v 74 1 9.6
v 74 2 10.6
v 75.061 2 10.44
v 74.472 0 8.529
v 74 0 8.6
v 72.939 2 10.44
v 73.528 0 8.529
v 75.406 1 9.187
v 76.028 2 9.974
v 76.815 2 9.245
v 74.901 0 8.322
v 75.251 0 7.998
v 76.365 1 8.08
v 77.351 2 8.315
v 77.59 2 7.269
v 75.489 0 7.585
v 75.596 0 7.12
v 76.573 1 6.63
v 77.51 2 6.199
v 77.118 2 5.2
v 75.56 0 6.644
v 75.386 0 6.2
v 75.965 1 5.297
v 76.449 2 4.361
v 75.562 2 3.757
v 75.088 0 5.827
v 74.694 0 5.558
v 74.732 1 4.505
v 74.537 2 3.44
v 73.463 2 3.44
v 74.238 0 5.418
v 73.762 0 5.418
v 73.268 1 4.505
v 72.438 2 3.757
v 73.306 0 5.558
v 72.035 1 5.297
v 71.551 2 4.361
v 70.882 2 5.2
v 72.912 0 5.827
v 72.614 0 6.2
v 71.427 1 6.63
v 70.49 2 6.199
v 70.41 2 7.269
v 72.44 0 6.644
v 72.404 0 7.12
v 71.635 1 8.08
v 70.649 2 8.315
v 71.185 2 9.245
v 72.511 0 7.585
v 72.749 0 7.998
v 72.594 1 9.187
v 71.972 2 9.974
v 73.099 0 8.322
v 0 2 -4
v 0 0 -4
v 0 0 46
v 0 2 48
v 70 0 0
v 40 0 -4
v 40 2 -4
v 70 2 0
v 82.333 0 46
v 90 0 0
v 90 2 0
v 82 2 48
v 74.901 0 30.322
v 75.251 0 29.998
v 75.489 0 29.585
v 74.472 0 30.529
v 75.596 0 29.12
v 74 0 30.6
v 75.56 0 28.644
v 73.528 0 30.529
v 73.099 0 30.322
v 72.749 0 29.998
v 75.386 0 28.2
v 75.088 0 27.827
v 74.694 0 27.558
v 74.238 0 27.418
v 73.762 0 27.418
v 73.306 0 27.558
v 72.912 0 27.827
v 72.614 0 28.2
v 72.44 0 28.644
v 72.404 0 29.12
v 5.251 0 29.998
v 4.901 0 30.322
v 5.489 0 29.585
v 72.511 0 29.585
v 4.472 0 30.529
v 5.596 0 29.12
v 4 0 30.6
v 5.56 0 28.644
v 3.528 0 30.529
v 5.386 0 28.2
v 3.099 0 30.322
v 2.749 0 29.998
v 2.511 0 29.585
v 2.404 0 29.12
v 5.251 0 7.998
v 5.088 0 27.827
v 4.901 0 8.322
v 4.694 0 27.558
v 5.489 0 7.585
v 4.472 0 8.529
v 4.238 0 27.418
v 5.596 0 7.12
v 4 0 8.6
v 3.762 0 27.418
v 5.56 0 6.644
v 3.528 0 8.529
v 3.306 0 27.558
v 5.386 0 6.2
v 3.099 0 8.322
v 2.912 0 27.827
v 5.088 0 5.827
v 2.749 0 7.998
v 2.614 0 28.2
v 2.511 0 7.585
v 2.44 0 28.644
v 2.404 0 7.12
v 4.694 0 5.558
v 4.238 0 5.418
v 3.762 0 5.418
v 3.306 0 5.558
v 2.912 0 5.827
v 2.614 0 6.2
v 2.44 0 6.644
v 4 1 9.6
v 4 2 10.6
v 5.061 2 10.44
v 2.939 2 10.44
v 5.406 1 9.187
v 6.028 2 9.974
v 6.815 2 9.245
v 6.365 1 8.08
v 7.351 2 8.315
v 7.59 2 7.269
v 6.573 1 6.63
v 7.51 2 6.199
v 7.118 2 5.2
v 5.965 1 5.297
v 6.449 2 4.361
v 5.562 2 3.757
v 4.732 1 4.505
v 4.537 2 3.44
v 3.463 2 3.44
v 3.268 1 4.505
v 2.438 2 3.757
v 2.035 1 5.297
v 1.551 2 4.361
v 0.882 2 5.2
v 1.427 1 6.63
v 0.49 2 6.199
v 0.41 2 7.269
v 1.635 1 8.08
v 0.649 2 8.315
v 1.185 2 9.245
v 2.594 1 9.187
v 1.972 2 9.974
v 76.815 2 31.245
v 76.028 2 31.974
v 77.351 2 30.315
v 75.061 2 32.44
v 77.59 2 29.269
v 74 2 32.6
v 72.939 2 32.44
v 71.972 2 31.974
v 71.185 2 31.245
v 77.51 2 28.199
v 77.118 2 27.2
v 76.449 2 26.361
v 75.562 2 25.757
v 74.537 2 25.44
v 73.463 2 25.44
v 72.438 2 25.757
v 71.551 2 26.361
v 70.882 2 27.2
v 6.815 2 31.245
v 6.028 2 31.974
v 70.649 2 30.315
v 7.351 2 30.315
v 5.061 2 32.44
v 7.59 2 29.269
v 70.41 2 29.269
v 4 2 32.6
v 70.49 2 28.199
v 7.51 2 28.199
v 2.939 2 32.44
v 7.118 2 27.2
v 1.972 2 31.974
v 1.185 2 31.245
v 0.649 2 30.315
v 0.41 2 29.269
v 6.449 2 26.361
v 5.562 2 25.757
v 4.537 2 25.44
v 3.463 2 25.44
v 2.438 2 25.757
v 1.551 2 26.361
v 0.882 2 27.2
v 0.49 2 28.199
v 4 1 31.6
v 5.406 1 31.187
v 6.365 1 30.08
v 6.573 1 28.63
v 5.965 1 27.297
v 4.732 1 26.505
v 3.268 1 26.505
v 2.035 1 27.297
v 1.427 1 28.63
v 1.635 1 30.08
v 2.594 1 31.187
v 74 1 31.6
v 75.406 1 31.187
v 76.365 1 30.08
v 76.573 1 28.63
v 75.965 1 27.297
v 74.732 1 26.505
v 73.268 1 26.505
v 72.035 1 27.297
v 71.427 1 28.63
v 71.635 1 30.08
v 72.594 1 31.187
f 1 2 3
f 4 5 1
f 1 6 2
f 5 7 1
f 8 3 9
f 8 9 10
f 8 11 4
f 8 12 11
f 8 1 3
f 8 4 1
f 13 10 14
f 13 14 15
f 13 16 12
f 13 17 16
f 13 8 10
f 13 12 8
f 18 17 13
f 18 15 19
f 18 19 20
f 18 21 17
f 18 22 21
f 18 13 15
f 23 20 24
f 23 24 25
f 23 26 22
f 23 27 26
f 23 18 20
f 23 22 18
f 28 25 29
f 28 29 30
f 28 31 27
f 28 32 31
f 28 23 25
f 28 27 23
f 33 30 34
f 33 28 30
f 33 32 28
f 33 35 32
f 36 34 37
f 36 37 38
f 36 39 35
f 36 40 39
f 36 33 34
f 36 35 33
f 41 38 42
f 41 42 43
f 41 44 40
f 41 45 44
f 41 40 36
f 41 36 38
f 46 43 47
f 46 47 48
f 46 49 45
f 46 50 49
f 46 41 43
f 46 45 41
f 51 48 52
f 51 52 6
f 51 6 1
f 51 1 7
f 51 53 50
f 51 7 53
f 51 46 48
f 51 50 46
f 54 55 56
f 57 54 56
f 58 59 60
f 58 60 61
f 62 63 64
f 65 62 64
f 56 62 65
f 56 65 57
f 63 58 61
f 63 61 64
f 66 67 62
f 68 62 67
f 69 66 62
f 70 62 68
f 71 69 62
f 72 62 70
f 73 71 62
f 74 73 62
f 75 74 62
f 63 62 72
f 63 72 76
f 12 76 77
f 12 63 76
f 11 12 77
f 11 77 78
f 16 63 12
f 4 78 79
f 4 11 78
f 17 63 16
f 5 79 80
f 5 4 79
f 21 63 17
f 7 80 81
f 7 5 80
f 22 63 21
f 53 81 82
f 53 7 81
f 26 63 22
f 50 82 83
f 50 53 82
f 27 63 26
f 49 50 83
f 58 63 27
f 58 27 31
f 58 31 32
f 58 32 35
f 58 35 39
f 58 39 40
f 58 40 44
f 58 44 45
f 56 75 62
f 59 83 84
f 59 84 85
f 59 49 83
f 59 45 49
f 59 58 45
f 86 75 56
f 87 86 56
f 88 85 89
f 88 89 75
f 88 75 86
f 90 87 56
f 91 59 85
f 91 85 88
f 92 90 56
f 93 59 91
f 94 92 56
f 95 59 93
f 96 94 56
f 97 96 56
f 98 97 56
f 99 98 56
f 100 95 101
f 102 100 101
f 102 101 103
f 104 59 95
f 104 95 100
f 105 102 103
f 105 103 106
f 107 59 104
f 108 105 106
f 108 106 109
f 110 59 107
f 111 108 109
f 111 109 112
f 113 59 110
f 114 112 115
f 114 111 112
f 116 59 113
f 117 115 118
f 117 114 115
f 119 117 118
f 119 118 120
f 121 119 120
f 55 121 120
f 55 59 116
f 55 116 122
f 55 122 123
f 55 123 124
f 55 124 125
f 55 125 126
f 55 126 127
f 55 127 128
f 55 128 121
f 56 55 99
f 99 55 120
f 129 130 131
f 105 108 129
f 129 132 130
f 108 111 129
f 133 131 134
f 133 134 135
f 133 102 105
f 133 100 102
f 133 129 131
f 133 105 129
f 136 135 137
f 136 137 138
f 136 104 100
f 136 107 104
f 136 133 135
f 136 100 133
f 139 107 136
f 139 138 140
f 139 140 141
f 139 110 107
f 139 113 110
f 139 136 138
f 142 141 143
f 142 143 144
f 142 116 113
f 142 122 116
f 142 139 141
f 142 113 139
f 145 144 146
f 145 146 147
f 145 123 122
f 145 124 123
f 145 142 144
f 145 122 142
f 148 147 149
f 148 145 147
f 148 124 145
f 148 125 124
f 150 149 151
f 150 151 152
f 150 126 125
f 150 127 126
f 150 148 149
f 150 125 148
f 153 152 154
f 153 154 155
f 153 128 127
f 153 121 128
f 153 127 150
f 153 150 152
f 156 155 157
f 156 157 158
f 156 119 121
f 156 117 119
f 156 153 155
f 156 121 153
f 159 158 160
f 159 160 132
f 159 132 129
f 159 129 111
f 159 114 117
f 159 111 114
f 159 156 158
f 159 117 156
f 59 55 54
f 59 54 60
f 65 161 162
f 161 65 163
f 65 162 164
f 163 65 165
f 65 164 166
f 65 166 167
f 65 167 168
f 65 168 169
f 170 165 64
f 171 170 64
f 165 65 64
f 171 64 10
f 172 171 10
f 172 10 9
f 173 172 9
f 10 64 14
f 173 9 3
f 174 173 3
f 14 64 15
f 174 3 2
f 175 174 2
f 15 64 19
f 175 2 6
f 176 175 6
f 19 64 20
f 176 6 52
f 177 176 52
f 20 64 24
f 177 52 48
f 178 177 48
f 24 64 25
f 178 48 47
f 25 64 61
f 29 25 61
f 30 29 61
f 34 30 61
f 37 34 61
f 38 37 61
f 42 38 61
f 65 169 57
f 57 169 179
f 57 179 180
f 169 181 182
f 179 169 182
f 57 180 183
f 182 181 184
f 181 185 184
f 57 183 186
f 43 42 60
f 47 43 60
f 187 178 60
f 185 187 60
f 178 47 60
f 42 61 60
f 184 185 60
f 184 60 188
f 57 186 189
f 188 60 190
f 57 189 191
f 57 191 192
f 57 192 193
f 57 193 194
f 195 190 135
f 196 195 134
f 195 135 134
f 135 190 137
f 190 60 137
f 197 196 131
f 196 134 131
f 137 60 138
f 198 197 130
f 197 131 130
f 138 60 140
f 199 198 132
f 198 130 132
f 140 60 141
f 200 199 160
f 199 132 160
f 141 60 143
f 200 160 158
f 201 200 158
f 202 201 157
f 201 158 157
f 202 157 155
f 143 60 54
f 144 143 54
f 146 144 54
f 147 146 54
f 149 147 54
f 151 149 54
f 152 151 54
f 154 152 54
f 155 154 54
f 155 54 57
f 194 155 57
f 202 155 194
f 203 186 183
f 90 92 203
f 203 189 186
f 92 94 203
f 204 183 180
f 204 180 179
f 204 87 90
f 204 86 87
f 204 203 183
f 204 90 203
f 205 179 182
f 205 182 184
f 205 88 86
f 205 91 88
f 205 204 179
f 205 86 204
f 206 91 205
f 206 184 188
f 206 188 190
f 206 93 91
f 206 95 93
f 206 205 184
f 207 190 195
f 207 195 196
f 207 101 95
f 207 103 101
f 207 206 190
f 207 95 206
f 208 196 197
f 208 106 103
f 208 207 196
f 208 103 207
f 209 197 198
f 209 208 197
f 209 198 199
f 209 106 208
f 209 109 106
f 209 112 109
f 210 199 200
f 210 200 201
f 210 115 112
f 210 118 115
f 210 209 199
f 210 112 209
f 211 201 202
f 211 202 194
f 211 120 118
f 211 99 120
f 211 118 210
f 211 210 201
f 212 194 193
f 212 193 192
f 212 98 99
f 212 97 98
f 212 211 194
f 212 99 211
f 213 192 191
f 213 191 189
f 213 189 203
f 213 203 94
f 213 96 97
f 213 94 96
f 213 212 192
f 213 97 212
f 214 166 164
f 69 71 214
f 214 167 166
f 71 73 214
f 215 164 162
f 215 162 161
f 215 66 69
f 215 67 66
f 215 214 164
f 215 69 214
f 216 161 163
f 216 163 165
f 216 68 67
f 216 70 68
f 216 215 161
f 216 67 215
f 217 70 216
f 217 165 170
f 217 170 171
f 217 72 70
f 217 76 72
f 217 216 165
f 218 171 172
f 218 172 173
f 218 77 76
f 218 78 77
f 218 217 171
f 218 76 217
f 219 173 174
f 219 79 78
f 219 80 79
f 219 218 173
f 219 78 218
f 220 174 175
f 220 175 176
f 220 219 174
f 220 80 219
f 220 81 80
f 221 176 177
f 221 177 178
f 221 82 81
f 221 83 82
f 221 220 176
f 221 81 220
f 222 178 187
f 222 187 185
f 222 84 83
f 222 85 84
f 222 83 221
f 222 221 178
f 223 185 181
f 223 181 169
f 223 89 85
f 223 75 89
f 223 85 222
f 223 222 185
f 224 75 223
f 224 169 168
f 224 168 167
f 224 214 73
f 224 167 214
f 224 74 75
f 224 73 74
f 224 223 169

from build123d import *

# Parameters (mm, degrees)
BOSS_EXTRUDE1_DEPTH = 2
CHAMFER1_SIZE       = 2
SKETCH2_R           = 1.6
CUT_EXTRUDE1_DEPTH  = 103.019605959
CHAMFER2_SIZE       = 2


with BuildPart() as part:
    # Sketch1 → Boss-Extrude1 (new body)
    with BuildSketch(Plane(origin=(0, 0, 0), x_dir=(1, 0, 0), z_dir=(0, 1, 0))):
        Polygon((0, 0), (0, 4), (40, 4), (70, 0), (90, 0), (82, -48), (0, -48), align=None)
    extrude(amount=BOSS_EXTRUDE1_DEPTH)

    # Chamfer1
    chamfer1_edges = [part.edges().sort_by_distance(p)[0] for p in [
        (41, 0, 48),
    ]]
    chamfer(chamfer1_edges, length=CHAMFER1_SIZE - 0.0001)  # a hair under: the kernel refuses the full size

    # Sketch2 → Cut-Extrude1 (cut, through all)
    with BuildSketch(Plane(origin=(0, 2, 0), x_dir=(1, 0, 0), z_dir=(0, 1, 0))):
        with Locations(Location((4, -7, 0), (0, 0, 270))):
            Circle(SKETCH2_R)
        with Locations(Location((4, -29, 0), (0, 0, 270))):
            Circle(SKETCH2_R)
        with Locations(Location((74, -7, 0), (0, 0, 270))):
            Circle(SKETCH2_R)
        with Locations(Location((74, -29, 0), (0, 0, 270))):
            Circle(SKETCH2_R)
    extrude(amount=-CUT_EXTRUDE1_DEPTH, mode=Mode.SUBTRACT)

    # Chamfer2
    chamfer2_edges = [part.edges().sort_by_distance(p)[0] for p in [
        (4, 2, 27.4),
        (74, 2, 5.4),
        (74, 2, 27.4),
        (4, 2, 5.4),
    ]]
    chamfer(chamfer2_edges, length=CHAMFER2_SIZE - 0.0001)  # a hair under: the kernel refuses the full size


solid = part.part
